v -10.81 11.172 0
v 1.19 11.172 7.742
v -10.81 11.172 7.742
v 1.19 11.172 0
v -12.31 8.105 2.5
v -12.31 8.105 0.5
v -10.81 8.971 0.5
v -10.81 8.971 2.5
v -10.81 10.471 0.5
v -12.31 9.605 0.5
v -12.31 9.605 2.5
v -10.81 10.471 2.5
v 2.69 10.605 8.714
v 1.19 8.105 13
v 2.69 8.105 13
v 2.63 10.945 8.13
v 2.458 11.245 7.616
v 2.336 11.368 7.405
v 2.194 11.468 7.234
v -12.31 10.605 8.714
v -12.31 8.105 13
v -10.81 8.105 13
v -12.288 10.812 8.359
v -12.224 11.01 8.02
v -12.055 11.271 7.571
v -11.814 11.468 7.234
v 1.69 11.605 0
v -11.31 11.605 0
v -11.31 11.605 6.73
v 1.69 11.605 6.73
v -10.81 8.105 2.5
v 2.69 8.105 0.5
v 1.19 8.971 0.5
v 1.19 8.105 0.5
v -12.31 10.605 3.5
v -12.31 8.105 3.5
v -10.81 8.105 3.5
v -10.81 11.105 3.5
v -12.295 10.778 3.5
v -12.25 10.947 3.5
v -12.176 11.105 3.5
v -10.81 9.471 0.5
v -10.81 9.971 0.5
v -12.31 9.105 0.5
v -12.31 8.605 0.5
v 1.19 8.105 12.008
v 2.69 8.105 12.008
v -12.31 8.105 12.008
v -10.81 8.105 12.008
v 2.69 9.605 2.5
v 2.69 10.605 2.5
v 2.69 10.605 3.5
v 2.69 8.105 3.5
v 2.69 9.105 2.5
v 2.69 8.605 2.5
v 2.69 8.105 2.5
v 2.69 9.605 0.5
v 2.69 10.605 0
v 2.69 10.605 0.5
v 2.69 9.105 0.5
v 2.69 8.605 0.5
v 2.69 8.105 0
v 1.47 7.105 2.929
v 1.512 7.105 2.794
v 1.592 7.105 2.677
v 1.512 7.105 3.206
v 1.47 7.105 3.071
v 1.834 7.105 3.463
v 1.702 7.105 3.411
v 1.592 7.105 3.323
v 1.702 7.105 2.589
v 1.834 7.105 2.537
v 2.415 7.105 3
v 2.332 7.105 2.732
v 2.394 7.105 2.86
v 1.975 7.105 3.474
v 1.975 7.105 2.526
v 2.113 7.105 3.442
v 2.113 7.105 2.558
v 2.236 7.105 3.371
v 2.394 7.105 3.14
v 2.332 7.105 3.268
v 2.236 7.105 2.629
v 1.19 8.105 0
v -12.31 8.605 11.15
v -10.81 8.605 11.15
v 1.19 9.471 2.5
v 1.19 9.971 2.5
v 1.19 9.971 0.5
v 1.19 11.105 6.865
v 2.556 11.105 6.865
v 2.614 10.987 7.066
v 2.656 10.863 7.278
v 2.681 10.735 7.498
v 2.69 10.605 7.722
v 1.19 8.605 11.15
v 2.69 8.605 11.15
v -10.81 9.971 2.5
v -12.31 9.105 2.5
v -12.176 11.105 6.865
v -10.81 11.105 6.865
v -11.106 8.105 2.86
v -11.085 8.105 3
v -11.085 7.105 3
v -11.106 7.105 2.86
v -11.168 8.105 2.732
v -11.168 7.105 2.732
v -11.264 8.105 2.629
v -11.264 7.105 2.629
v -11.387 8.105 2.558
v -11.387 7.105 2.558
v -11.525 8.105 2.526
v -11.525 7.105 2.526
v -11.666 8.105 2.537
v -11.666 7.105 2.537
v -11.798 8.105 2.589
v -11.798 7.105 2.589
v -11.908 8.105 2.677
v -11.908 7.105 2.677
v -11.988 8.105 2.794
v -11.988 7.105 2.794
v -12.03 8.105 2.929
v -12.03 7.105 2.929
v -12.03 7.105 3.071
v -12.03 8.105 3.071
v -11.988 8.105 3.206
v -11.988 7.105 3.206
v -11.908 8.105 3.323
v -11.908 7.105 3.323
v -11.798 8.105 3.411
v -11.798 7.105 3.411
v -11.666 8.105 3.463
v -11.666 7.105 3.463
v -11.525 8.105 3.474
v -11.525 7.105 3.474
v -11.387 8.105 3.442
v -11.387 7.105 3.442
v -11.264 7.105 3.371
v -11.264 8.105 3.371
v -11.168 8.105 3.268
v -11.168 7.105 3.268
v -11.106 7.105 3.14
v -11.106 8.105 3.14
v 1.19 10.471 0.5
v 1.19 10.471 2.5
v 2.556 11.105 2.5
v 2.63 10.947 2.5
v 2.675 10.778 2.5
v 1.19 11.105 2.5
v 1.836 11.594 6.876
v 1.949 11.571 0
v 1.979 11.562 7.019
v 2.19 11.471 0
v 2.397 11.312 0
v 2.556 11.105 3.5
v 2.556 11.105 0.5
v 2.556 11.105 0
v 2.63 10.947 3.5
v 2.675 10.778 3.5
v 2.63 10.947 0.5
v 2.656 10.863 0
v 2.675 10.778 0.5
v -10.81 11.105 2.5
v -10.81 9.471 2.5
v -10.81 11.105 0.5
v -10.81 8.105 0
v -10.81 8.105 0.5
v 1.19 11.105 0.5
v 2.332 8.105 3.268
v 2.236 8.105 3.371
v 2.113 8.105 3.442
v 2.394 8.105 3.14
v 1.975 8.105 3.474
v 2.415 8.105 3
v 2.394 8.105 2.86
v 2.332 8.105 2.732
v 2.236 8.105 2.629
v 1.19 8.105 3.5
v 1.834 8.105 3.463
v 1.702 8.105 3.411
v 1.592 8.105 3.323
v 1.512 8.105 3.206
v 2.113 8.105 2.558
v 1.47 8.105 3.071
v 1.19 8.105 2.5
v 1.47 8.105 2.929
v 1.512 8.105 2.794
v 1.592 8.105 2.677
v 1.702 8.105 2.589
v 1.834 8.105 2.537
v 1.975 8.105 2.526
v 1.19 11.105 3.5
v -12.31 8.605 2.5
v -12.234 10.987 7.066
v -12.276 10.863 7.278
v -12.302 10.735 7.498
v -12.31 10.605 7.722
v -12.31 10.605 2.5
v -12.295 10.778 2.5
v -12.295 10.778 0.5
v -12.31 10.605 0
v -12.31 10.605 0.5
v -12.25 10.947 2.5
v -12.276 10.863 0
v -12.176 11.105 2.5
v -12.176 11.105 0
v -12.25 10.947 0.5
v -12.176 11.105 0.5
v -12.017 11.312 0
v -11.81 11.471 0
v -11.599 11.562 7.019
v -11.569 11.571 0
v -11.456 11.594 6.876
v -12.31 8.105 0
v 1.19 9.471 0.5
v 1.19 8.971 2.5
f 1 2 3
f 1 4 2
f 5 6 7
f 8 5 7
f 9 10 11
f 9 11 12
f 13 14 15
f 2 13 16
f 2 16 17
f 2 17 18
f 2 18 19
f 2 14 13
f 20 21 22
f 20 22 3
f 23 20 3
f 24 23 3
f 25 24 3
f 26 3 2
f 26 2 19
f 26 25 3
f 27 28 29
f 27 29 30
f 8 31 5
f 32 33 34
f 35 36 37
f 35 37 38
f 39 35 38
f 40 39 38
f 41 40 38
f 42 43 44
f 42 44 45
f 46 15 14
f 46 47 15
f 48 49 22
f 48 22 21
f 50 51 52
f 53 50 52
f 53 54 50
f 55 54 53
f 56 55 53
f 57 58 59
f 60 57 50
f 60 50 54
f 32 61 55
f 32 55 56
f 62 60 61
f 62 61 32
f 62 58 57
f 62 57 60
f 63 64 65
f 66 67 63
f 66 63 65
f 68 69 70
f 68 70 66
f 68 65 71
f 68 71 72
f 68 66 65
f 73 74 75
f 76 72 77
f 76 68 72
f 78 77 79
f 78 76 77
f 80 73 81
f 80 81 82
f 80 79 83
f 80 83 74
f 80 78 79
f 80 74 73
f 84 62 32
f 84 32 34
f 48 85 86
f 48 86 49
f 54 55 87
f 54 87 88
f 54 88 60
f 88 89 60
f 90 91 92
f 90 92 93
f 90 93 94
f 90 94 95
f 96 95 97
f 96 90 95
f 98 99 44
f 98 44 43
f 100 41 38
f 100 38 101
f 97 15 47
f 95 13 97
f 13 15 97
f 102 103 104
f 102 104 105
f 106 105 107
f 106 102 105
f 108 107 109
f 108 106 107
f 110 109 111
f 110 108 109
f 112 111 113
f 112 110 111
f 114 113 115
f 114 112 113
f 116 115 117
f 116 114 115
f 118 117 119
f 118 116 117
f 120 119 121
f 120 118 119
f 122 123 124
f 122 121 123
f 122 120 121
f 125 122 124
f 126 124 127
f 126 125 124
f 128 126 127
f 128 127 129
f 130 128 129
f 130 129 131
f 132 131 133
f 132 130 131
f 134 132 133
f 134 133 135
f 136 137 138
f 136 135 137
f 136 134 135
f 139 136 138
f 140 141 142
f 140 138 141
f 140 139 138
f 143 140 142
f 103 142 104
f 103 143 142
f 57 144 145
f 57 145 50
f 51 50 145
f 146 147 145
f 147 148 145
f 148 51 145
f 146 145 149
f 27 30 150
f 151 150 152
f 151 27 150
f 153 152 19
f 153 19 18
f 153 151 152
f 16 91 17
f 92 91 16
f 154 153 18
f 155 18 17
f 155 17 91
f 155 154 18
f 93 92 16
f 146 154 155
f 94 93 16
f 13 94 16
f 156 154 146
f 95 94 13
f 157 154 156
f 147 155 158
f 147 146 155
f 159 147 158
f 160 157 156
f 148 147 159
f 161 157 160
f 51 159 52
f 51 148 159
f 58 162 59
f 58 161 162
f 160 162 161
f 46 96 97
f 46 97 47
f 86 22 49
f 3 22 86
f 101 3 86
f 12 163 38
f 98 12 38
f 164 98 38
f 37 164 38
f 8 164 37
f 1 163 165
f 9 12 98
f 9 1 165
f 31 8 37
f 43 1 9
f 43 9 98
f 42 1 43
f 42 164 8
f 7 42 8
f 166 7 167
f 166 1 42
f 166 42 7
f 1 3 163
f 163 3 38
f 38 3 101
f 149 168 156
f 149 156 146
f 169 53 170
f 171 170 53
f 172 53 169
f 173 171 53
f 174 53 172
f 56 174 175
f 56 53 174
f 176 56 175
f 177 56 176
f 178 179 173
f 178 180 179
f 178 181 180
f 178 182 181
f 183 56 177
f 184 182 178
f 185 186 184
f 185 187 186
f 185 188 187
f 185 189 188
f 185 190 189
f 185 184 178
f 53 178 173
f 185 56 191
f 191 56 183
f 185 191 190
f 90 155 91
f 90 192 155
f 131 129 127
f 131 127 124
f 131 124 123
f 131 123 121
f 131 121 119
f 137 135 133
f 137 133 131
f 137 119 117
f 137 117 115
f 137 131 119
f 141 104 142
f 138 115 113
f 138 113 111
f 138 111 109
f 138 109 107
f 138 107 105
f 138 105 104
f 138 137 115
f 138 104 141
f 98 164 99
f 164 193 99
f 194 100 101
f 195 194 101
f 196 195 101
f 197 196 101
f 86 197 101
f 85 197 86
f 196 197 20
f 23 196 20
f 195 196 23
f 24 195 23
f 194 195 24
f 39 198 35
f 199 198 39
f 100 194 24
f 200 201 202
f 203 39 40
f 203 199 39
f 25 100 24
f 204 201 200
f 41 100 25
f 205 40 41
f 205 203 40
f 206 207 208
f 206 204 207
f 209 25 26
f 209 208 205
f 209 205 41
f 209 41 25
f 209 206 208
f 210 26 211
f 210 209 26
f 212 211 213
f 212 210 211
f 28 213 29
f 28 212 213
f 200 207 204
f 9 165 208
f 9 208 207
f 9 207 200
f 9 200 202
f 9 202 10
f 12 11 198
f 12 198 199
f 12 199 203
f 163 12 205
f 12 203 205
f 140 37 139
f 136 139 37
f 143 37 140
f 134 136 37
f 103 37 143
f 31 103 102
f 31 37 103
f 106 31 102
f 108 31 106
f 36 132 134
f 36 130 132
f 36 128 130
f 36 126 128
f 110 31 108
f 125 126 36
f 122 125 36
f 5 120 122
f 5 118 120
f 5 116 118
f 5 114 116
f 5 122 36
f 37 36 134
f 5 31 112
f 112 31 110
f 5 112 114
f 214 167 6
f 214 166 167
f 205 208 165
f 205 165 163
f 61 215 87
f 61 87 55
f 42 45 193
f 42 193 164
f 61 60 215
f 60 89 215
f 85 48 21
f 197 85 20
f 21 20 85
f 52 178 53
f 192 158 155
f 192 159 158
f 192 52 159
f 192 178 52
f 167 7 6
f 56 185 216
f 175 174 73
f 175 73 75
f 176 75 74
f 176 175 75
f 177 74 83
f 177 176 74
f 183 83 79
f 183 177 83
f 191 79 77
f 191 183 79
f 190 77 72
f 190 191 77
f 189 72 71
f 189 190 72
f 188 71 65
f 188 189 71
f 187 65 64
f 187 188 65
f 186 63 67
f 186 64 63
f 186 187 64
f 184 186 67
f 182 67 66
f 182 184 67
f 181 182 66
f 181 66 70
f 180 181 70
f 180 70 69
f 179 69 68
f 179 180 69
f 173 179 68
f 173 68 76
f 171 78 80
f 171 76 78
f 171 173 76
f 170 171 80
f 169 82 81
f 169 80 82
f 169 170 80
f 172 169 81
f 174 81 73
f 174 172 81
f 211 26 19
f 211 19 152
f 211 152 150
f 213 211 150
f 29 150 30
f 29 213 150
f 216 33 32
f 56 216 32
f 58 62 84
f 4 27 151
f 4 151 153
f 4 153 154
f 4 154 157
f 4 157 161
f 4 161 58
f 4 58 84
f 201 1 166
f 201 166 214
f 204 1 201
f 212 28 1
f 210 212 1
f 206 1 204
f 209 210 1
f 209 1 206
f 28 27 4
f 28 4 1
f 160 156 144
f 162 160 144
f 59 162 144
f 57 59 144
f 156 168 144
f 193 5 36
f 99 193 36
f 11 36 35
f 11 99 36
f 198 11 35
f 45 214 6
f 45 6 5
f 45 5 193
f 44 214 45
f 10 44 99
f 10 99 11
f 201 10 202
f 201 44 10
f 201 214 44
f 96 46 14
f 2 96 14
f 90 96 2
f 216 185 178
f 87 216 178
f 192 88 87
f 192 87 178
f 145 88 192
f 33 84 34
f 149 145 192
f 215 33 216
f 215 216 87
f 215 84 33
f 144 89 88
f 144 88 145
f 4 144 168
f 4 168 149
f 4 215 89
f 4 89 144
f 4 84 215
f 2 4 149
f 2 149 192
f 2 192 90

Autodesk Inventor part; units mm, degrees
ref_plane "YZ Plane" through (0, 0, 0) normal (1, 0, 0) x (0, 1, 0)
ref_plane "XZ Plane" through (0, 0, 0) normal (0, 1, 0) x (-1, 0, 0)
sketch "Szkic1" plane through (0, 0, 0) normal (0, 0, 1) x (1, 0, 0)
  line L0 (-10.8101, 8.1046) -> (-12.3101, 8.1046)
  line L1 (-12.3101, 8.1046) -> (-12.3101, 11.6046)
  line L2 (-12.3101, 11.6046) -> (-10.8101, 11.6046)
  line L3 (-10.8101, 11.6046) -> (-10.8101, 8.1046)
  line L4 (-10.8101, 11.6046) -> (1.1899, 11.6046)
  line L5 (1.1899, 11.6046) -> (1.1899, 11.1716)
  line L6 (1.1899, 11.1716) -> (-10.8101, 11.1716)
  line L7 (-10.8101, 11.1716) -> (-10.8101, 11.6046)
  line L8 (1.1899, 11.6046) -> (2.6899, 11.6046)
  line L9 (2.6899, 11.6046) -> (2.6899, 8.1046)
  line L10 (2.6899, 8.1046) -> (1.1899, 8.1046)
  line L11 (1.1899, 8.1046) -> (1.1899, 11.6046)
  point P0 (0, 0)
  dimension "d0" = 1.5
  dimension "d1" = 1.5
  dimension "d2" = 15
  dimension "d3" = 0.433
  dimension "d6" = 3.5
extrude "Wyciągnięcie proste1" add sketch "Szkic1" along normal blind 13
sketch "Szkic2" plane through (-12.3101, 8.1046, 0) normal (-1, 0, 0) x (0, 0, 1)
  line L0 (0, 0) -> (13, 0) projected
  line L1 (13, 0) -> (7, 3.5)
  line L2 (0, 3.5) -> (13, 3.5) projected
  line L3 (0, 3.5) -> (0, 0) projected
  line L4 (13, 3.5) -> (13, 0) projected
  line L5 (13, 0) -> (13, 3.5)
  point P0 (0, -8.1046)
  dimension "d7" = 7
extrude "Wyciągnięcie proste2" cut sketch "Szkic2" against normal through all contours L1 L2 L4
sketch "Szkic4" plane through (-12.3101, 8.1046, 0) normal (0, -1, 0) x (1, 0, 0)
  circle A0 centre (14.25, 3) radius 0.475
  line L0 (13.5, 0) -> (13.5, 13) projected
  line L1 (13.5, 0) -> (15, 0) projected
  circle A1 centre (0.75, 3) radius 0.475
  line L2 (0, 0) -> (1.5, 0) projected
  line L3 (0, 0) -> (0, 13) projected
  point P0 (12.3101, 0)
  dimension "d10" = 0.95
  dimension "d11" = 0.75
  dimension "d12" = 3
  dimension "d13" = 3
  dimension "d14" = 0.75
  dimension "d15" = 0.95
extrude "Wyciągnięcie proste3" add sketch "Szkic4" along normal blind 1
sketch "Szkic5" plane through (-12.3101, 8.1046, 0) normal (-1, 0, 0) x (0, 0, 1)
  line L0 (0, 0) -> (13, 0) projected
  line L1 (0, 3.5) -> (7, 3.5) projected
  line L2 (13, 0) -> (7, 3.5) projected
  line L3 (0, 3.5) -> (7, 3.5) projected
  line L4 (0, 3.5) -> (0, 0) projected
  line L5 (0, 0) -> (13, 0) projected
  line L6 (6.8648, 3) -> (11.1505, 0.5)
  line L7 (0.5, 0.5) -> (0.5, 3)
  line L8 (0.5, 3) -> (6.8648, 3)
  line L9 (11.1505, 0.5) -> (12.0077, 0)
  line L10 (0.5, 0.5) -> (0.5, 0)
  line L11 (2.5, 0) -> (2.5, 3)
  line L12 (3.5, 0) -> (3.5, 3)
  point P0 (0, -8.1046)
  dimension "d19" = 0.5
  dimension "d20" = 1
  dimension "d21" = 2
extrude "Wyciągnięcie proste4" cut sketch "Szkic5" against normal blind 15 contours L10 L7 L8 L11 L0 | L12 L8 L6 L9 L0
sketch "Szkic7" plane through (0, 0, 0) normal (0, 0, -1) x (-1, 0, 0)
  line L0 (12.3101, 11.6046) -> (12.3101, 8.1046) projected
  line L1 (12.3101, 8.1046) -> (10.8101, 8.9706)
  line L2 (10.8101, 8.1046) -> (10.8101, 11.1046) projected
  line L3 (12.3101, 8.6046) -> (10.8101, 9.4706)
  line L4 (12.3101, 8.1046) -> (10.8101, 8.1046) projected
  point P0 (0, 0)
  dimension "d33" = 60
  dimension "d34" = 60
  dimension "d35" = 0
  dimension "d36" = 0.5
extrude "Wyciągnięcie proste6" add sketch "Szkic7" against normal blind 3 contours L0 L1 L2 L3
pattern_linear "Szyk prostokątny1" count 2 spacing 1 along (0, 1, 0) of "Wyciągnięcie proste6"
ref_plane "Płaszczyzna konstrukcyjna1" through (-4.8101, 8.1046, 0) normal (-1, 0, 0) x (0, 0, 1)
mirror "Odbij1" about plane through (-4.8101, 8.1046, 0) normal (-1, 0, 0) of "Wyciągnięcie proste6", "Szyk prostokątny1"
fillet "Zaokrąglenie1" radius 1 3 edges at (-12.3101, 11.6046, 3.5) (-4.8101, 11.6046, 7) (2.6899, 11.6046, 3.5)
properties part number "dach" material "Tworzywo sztuczne ABS"
